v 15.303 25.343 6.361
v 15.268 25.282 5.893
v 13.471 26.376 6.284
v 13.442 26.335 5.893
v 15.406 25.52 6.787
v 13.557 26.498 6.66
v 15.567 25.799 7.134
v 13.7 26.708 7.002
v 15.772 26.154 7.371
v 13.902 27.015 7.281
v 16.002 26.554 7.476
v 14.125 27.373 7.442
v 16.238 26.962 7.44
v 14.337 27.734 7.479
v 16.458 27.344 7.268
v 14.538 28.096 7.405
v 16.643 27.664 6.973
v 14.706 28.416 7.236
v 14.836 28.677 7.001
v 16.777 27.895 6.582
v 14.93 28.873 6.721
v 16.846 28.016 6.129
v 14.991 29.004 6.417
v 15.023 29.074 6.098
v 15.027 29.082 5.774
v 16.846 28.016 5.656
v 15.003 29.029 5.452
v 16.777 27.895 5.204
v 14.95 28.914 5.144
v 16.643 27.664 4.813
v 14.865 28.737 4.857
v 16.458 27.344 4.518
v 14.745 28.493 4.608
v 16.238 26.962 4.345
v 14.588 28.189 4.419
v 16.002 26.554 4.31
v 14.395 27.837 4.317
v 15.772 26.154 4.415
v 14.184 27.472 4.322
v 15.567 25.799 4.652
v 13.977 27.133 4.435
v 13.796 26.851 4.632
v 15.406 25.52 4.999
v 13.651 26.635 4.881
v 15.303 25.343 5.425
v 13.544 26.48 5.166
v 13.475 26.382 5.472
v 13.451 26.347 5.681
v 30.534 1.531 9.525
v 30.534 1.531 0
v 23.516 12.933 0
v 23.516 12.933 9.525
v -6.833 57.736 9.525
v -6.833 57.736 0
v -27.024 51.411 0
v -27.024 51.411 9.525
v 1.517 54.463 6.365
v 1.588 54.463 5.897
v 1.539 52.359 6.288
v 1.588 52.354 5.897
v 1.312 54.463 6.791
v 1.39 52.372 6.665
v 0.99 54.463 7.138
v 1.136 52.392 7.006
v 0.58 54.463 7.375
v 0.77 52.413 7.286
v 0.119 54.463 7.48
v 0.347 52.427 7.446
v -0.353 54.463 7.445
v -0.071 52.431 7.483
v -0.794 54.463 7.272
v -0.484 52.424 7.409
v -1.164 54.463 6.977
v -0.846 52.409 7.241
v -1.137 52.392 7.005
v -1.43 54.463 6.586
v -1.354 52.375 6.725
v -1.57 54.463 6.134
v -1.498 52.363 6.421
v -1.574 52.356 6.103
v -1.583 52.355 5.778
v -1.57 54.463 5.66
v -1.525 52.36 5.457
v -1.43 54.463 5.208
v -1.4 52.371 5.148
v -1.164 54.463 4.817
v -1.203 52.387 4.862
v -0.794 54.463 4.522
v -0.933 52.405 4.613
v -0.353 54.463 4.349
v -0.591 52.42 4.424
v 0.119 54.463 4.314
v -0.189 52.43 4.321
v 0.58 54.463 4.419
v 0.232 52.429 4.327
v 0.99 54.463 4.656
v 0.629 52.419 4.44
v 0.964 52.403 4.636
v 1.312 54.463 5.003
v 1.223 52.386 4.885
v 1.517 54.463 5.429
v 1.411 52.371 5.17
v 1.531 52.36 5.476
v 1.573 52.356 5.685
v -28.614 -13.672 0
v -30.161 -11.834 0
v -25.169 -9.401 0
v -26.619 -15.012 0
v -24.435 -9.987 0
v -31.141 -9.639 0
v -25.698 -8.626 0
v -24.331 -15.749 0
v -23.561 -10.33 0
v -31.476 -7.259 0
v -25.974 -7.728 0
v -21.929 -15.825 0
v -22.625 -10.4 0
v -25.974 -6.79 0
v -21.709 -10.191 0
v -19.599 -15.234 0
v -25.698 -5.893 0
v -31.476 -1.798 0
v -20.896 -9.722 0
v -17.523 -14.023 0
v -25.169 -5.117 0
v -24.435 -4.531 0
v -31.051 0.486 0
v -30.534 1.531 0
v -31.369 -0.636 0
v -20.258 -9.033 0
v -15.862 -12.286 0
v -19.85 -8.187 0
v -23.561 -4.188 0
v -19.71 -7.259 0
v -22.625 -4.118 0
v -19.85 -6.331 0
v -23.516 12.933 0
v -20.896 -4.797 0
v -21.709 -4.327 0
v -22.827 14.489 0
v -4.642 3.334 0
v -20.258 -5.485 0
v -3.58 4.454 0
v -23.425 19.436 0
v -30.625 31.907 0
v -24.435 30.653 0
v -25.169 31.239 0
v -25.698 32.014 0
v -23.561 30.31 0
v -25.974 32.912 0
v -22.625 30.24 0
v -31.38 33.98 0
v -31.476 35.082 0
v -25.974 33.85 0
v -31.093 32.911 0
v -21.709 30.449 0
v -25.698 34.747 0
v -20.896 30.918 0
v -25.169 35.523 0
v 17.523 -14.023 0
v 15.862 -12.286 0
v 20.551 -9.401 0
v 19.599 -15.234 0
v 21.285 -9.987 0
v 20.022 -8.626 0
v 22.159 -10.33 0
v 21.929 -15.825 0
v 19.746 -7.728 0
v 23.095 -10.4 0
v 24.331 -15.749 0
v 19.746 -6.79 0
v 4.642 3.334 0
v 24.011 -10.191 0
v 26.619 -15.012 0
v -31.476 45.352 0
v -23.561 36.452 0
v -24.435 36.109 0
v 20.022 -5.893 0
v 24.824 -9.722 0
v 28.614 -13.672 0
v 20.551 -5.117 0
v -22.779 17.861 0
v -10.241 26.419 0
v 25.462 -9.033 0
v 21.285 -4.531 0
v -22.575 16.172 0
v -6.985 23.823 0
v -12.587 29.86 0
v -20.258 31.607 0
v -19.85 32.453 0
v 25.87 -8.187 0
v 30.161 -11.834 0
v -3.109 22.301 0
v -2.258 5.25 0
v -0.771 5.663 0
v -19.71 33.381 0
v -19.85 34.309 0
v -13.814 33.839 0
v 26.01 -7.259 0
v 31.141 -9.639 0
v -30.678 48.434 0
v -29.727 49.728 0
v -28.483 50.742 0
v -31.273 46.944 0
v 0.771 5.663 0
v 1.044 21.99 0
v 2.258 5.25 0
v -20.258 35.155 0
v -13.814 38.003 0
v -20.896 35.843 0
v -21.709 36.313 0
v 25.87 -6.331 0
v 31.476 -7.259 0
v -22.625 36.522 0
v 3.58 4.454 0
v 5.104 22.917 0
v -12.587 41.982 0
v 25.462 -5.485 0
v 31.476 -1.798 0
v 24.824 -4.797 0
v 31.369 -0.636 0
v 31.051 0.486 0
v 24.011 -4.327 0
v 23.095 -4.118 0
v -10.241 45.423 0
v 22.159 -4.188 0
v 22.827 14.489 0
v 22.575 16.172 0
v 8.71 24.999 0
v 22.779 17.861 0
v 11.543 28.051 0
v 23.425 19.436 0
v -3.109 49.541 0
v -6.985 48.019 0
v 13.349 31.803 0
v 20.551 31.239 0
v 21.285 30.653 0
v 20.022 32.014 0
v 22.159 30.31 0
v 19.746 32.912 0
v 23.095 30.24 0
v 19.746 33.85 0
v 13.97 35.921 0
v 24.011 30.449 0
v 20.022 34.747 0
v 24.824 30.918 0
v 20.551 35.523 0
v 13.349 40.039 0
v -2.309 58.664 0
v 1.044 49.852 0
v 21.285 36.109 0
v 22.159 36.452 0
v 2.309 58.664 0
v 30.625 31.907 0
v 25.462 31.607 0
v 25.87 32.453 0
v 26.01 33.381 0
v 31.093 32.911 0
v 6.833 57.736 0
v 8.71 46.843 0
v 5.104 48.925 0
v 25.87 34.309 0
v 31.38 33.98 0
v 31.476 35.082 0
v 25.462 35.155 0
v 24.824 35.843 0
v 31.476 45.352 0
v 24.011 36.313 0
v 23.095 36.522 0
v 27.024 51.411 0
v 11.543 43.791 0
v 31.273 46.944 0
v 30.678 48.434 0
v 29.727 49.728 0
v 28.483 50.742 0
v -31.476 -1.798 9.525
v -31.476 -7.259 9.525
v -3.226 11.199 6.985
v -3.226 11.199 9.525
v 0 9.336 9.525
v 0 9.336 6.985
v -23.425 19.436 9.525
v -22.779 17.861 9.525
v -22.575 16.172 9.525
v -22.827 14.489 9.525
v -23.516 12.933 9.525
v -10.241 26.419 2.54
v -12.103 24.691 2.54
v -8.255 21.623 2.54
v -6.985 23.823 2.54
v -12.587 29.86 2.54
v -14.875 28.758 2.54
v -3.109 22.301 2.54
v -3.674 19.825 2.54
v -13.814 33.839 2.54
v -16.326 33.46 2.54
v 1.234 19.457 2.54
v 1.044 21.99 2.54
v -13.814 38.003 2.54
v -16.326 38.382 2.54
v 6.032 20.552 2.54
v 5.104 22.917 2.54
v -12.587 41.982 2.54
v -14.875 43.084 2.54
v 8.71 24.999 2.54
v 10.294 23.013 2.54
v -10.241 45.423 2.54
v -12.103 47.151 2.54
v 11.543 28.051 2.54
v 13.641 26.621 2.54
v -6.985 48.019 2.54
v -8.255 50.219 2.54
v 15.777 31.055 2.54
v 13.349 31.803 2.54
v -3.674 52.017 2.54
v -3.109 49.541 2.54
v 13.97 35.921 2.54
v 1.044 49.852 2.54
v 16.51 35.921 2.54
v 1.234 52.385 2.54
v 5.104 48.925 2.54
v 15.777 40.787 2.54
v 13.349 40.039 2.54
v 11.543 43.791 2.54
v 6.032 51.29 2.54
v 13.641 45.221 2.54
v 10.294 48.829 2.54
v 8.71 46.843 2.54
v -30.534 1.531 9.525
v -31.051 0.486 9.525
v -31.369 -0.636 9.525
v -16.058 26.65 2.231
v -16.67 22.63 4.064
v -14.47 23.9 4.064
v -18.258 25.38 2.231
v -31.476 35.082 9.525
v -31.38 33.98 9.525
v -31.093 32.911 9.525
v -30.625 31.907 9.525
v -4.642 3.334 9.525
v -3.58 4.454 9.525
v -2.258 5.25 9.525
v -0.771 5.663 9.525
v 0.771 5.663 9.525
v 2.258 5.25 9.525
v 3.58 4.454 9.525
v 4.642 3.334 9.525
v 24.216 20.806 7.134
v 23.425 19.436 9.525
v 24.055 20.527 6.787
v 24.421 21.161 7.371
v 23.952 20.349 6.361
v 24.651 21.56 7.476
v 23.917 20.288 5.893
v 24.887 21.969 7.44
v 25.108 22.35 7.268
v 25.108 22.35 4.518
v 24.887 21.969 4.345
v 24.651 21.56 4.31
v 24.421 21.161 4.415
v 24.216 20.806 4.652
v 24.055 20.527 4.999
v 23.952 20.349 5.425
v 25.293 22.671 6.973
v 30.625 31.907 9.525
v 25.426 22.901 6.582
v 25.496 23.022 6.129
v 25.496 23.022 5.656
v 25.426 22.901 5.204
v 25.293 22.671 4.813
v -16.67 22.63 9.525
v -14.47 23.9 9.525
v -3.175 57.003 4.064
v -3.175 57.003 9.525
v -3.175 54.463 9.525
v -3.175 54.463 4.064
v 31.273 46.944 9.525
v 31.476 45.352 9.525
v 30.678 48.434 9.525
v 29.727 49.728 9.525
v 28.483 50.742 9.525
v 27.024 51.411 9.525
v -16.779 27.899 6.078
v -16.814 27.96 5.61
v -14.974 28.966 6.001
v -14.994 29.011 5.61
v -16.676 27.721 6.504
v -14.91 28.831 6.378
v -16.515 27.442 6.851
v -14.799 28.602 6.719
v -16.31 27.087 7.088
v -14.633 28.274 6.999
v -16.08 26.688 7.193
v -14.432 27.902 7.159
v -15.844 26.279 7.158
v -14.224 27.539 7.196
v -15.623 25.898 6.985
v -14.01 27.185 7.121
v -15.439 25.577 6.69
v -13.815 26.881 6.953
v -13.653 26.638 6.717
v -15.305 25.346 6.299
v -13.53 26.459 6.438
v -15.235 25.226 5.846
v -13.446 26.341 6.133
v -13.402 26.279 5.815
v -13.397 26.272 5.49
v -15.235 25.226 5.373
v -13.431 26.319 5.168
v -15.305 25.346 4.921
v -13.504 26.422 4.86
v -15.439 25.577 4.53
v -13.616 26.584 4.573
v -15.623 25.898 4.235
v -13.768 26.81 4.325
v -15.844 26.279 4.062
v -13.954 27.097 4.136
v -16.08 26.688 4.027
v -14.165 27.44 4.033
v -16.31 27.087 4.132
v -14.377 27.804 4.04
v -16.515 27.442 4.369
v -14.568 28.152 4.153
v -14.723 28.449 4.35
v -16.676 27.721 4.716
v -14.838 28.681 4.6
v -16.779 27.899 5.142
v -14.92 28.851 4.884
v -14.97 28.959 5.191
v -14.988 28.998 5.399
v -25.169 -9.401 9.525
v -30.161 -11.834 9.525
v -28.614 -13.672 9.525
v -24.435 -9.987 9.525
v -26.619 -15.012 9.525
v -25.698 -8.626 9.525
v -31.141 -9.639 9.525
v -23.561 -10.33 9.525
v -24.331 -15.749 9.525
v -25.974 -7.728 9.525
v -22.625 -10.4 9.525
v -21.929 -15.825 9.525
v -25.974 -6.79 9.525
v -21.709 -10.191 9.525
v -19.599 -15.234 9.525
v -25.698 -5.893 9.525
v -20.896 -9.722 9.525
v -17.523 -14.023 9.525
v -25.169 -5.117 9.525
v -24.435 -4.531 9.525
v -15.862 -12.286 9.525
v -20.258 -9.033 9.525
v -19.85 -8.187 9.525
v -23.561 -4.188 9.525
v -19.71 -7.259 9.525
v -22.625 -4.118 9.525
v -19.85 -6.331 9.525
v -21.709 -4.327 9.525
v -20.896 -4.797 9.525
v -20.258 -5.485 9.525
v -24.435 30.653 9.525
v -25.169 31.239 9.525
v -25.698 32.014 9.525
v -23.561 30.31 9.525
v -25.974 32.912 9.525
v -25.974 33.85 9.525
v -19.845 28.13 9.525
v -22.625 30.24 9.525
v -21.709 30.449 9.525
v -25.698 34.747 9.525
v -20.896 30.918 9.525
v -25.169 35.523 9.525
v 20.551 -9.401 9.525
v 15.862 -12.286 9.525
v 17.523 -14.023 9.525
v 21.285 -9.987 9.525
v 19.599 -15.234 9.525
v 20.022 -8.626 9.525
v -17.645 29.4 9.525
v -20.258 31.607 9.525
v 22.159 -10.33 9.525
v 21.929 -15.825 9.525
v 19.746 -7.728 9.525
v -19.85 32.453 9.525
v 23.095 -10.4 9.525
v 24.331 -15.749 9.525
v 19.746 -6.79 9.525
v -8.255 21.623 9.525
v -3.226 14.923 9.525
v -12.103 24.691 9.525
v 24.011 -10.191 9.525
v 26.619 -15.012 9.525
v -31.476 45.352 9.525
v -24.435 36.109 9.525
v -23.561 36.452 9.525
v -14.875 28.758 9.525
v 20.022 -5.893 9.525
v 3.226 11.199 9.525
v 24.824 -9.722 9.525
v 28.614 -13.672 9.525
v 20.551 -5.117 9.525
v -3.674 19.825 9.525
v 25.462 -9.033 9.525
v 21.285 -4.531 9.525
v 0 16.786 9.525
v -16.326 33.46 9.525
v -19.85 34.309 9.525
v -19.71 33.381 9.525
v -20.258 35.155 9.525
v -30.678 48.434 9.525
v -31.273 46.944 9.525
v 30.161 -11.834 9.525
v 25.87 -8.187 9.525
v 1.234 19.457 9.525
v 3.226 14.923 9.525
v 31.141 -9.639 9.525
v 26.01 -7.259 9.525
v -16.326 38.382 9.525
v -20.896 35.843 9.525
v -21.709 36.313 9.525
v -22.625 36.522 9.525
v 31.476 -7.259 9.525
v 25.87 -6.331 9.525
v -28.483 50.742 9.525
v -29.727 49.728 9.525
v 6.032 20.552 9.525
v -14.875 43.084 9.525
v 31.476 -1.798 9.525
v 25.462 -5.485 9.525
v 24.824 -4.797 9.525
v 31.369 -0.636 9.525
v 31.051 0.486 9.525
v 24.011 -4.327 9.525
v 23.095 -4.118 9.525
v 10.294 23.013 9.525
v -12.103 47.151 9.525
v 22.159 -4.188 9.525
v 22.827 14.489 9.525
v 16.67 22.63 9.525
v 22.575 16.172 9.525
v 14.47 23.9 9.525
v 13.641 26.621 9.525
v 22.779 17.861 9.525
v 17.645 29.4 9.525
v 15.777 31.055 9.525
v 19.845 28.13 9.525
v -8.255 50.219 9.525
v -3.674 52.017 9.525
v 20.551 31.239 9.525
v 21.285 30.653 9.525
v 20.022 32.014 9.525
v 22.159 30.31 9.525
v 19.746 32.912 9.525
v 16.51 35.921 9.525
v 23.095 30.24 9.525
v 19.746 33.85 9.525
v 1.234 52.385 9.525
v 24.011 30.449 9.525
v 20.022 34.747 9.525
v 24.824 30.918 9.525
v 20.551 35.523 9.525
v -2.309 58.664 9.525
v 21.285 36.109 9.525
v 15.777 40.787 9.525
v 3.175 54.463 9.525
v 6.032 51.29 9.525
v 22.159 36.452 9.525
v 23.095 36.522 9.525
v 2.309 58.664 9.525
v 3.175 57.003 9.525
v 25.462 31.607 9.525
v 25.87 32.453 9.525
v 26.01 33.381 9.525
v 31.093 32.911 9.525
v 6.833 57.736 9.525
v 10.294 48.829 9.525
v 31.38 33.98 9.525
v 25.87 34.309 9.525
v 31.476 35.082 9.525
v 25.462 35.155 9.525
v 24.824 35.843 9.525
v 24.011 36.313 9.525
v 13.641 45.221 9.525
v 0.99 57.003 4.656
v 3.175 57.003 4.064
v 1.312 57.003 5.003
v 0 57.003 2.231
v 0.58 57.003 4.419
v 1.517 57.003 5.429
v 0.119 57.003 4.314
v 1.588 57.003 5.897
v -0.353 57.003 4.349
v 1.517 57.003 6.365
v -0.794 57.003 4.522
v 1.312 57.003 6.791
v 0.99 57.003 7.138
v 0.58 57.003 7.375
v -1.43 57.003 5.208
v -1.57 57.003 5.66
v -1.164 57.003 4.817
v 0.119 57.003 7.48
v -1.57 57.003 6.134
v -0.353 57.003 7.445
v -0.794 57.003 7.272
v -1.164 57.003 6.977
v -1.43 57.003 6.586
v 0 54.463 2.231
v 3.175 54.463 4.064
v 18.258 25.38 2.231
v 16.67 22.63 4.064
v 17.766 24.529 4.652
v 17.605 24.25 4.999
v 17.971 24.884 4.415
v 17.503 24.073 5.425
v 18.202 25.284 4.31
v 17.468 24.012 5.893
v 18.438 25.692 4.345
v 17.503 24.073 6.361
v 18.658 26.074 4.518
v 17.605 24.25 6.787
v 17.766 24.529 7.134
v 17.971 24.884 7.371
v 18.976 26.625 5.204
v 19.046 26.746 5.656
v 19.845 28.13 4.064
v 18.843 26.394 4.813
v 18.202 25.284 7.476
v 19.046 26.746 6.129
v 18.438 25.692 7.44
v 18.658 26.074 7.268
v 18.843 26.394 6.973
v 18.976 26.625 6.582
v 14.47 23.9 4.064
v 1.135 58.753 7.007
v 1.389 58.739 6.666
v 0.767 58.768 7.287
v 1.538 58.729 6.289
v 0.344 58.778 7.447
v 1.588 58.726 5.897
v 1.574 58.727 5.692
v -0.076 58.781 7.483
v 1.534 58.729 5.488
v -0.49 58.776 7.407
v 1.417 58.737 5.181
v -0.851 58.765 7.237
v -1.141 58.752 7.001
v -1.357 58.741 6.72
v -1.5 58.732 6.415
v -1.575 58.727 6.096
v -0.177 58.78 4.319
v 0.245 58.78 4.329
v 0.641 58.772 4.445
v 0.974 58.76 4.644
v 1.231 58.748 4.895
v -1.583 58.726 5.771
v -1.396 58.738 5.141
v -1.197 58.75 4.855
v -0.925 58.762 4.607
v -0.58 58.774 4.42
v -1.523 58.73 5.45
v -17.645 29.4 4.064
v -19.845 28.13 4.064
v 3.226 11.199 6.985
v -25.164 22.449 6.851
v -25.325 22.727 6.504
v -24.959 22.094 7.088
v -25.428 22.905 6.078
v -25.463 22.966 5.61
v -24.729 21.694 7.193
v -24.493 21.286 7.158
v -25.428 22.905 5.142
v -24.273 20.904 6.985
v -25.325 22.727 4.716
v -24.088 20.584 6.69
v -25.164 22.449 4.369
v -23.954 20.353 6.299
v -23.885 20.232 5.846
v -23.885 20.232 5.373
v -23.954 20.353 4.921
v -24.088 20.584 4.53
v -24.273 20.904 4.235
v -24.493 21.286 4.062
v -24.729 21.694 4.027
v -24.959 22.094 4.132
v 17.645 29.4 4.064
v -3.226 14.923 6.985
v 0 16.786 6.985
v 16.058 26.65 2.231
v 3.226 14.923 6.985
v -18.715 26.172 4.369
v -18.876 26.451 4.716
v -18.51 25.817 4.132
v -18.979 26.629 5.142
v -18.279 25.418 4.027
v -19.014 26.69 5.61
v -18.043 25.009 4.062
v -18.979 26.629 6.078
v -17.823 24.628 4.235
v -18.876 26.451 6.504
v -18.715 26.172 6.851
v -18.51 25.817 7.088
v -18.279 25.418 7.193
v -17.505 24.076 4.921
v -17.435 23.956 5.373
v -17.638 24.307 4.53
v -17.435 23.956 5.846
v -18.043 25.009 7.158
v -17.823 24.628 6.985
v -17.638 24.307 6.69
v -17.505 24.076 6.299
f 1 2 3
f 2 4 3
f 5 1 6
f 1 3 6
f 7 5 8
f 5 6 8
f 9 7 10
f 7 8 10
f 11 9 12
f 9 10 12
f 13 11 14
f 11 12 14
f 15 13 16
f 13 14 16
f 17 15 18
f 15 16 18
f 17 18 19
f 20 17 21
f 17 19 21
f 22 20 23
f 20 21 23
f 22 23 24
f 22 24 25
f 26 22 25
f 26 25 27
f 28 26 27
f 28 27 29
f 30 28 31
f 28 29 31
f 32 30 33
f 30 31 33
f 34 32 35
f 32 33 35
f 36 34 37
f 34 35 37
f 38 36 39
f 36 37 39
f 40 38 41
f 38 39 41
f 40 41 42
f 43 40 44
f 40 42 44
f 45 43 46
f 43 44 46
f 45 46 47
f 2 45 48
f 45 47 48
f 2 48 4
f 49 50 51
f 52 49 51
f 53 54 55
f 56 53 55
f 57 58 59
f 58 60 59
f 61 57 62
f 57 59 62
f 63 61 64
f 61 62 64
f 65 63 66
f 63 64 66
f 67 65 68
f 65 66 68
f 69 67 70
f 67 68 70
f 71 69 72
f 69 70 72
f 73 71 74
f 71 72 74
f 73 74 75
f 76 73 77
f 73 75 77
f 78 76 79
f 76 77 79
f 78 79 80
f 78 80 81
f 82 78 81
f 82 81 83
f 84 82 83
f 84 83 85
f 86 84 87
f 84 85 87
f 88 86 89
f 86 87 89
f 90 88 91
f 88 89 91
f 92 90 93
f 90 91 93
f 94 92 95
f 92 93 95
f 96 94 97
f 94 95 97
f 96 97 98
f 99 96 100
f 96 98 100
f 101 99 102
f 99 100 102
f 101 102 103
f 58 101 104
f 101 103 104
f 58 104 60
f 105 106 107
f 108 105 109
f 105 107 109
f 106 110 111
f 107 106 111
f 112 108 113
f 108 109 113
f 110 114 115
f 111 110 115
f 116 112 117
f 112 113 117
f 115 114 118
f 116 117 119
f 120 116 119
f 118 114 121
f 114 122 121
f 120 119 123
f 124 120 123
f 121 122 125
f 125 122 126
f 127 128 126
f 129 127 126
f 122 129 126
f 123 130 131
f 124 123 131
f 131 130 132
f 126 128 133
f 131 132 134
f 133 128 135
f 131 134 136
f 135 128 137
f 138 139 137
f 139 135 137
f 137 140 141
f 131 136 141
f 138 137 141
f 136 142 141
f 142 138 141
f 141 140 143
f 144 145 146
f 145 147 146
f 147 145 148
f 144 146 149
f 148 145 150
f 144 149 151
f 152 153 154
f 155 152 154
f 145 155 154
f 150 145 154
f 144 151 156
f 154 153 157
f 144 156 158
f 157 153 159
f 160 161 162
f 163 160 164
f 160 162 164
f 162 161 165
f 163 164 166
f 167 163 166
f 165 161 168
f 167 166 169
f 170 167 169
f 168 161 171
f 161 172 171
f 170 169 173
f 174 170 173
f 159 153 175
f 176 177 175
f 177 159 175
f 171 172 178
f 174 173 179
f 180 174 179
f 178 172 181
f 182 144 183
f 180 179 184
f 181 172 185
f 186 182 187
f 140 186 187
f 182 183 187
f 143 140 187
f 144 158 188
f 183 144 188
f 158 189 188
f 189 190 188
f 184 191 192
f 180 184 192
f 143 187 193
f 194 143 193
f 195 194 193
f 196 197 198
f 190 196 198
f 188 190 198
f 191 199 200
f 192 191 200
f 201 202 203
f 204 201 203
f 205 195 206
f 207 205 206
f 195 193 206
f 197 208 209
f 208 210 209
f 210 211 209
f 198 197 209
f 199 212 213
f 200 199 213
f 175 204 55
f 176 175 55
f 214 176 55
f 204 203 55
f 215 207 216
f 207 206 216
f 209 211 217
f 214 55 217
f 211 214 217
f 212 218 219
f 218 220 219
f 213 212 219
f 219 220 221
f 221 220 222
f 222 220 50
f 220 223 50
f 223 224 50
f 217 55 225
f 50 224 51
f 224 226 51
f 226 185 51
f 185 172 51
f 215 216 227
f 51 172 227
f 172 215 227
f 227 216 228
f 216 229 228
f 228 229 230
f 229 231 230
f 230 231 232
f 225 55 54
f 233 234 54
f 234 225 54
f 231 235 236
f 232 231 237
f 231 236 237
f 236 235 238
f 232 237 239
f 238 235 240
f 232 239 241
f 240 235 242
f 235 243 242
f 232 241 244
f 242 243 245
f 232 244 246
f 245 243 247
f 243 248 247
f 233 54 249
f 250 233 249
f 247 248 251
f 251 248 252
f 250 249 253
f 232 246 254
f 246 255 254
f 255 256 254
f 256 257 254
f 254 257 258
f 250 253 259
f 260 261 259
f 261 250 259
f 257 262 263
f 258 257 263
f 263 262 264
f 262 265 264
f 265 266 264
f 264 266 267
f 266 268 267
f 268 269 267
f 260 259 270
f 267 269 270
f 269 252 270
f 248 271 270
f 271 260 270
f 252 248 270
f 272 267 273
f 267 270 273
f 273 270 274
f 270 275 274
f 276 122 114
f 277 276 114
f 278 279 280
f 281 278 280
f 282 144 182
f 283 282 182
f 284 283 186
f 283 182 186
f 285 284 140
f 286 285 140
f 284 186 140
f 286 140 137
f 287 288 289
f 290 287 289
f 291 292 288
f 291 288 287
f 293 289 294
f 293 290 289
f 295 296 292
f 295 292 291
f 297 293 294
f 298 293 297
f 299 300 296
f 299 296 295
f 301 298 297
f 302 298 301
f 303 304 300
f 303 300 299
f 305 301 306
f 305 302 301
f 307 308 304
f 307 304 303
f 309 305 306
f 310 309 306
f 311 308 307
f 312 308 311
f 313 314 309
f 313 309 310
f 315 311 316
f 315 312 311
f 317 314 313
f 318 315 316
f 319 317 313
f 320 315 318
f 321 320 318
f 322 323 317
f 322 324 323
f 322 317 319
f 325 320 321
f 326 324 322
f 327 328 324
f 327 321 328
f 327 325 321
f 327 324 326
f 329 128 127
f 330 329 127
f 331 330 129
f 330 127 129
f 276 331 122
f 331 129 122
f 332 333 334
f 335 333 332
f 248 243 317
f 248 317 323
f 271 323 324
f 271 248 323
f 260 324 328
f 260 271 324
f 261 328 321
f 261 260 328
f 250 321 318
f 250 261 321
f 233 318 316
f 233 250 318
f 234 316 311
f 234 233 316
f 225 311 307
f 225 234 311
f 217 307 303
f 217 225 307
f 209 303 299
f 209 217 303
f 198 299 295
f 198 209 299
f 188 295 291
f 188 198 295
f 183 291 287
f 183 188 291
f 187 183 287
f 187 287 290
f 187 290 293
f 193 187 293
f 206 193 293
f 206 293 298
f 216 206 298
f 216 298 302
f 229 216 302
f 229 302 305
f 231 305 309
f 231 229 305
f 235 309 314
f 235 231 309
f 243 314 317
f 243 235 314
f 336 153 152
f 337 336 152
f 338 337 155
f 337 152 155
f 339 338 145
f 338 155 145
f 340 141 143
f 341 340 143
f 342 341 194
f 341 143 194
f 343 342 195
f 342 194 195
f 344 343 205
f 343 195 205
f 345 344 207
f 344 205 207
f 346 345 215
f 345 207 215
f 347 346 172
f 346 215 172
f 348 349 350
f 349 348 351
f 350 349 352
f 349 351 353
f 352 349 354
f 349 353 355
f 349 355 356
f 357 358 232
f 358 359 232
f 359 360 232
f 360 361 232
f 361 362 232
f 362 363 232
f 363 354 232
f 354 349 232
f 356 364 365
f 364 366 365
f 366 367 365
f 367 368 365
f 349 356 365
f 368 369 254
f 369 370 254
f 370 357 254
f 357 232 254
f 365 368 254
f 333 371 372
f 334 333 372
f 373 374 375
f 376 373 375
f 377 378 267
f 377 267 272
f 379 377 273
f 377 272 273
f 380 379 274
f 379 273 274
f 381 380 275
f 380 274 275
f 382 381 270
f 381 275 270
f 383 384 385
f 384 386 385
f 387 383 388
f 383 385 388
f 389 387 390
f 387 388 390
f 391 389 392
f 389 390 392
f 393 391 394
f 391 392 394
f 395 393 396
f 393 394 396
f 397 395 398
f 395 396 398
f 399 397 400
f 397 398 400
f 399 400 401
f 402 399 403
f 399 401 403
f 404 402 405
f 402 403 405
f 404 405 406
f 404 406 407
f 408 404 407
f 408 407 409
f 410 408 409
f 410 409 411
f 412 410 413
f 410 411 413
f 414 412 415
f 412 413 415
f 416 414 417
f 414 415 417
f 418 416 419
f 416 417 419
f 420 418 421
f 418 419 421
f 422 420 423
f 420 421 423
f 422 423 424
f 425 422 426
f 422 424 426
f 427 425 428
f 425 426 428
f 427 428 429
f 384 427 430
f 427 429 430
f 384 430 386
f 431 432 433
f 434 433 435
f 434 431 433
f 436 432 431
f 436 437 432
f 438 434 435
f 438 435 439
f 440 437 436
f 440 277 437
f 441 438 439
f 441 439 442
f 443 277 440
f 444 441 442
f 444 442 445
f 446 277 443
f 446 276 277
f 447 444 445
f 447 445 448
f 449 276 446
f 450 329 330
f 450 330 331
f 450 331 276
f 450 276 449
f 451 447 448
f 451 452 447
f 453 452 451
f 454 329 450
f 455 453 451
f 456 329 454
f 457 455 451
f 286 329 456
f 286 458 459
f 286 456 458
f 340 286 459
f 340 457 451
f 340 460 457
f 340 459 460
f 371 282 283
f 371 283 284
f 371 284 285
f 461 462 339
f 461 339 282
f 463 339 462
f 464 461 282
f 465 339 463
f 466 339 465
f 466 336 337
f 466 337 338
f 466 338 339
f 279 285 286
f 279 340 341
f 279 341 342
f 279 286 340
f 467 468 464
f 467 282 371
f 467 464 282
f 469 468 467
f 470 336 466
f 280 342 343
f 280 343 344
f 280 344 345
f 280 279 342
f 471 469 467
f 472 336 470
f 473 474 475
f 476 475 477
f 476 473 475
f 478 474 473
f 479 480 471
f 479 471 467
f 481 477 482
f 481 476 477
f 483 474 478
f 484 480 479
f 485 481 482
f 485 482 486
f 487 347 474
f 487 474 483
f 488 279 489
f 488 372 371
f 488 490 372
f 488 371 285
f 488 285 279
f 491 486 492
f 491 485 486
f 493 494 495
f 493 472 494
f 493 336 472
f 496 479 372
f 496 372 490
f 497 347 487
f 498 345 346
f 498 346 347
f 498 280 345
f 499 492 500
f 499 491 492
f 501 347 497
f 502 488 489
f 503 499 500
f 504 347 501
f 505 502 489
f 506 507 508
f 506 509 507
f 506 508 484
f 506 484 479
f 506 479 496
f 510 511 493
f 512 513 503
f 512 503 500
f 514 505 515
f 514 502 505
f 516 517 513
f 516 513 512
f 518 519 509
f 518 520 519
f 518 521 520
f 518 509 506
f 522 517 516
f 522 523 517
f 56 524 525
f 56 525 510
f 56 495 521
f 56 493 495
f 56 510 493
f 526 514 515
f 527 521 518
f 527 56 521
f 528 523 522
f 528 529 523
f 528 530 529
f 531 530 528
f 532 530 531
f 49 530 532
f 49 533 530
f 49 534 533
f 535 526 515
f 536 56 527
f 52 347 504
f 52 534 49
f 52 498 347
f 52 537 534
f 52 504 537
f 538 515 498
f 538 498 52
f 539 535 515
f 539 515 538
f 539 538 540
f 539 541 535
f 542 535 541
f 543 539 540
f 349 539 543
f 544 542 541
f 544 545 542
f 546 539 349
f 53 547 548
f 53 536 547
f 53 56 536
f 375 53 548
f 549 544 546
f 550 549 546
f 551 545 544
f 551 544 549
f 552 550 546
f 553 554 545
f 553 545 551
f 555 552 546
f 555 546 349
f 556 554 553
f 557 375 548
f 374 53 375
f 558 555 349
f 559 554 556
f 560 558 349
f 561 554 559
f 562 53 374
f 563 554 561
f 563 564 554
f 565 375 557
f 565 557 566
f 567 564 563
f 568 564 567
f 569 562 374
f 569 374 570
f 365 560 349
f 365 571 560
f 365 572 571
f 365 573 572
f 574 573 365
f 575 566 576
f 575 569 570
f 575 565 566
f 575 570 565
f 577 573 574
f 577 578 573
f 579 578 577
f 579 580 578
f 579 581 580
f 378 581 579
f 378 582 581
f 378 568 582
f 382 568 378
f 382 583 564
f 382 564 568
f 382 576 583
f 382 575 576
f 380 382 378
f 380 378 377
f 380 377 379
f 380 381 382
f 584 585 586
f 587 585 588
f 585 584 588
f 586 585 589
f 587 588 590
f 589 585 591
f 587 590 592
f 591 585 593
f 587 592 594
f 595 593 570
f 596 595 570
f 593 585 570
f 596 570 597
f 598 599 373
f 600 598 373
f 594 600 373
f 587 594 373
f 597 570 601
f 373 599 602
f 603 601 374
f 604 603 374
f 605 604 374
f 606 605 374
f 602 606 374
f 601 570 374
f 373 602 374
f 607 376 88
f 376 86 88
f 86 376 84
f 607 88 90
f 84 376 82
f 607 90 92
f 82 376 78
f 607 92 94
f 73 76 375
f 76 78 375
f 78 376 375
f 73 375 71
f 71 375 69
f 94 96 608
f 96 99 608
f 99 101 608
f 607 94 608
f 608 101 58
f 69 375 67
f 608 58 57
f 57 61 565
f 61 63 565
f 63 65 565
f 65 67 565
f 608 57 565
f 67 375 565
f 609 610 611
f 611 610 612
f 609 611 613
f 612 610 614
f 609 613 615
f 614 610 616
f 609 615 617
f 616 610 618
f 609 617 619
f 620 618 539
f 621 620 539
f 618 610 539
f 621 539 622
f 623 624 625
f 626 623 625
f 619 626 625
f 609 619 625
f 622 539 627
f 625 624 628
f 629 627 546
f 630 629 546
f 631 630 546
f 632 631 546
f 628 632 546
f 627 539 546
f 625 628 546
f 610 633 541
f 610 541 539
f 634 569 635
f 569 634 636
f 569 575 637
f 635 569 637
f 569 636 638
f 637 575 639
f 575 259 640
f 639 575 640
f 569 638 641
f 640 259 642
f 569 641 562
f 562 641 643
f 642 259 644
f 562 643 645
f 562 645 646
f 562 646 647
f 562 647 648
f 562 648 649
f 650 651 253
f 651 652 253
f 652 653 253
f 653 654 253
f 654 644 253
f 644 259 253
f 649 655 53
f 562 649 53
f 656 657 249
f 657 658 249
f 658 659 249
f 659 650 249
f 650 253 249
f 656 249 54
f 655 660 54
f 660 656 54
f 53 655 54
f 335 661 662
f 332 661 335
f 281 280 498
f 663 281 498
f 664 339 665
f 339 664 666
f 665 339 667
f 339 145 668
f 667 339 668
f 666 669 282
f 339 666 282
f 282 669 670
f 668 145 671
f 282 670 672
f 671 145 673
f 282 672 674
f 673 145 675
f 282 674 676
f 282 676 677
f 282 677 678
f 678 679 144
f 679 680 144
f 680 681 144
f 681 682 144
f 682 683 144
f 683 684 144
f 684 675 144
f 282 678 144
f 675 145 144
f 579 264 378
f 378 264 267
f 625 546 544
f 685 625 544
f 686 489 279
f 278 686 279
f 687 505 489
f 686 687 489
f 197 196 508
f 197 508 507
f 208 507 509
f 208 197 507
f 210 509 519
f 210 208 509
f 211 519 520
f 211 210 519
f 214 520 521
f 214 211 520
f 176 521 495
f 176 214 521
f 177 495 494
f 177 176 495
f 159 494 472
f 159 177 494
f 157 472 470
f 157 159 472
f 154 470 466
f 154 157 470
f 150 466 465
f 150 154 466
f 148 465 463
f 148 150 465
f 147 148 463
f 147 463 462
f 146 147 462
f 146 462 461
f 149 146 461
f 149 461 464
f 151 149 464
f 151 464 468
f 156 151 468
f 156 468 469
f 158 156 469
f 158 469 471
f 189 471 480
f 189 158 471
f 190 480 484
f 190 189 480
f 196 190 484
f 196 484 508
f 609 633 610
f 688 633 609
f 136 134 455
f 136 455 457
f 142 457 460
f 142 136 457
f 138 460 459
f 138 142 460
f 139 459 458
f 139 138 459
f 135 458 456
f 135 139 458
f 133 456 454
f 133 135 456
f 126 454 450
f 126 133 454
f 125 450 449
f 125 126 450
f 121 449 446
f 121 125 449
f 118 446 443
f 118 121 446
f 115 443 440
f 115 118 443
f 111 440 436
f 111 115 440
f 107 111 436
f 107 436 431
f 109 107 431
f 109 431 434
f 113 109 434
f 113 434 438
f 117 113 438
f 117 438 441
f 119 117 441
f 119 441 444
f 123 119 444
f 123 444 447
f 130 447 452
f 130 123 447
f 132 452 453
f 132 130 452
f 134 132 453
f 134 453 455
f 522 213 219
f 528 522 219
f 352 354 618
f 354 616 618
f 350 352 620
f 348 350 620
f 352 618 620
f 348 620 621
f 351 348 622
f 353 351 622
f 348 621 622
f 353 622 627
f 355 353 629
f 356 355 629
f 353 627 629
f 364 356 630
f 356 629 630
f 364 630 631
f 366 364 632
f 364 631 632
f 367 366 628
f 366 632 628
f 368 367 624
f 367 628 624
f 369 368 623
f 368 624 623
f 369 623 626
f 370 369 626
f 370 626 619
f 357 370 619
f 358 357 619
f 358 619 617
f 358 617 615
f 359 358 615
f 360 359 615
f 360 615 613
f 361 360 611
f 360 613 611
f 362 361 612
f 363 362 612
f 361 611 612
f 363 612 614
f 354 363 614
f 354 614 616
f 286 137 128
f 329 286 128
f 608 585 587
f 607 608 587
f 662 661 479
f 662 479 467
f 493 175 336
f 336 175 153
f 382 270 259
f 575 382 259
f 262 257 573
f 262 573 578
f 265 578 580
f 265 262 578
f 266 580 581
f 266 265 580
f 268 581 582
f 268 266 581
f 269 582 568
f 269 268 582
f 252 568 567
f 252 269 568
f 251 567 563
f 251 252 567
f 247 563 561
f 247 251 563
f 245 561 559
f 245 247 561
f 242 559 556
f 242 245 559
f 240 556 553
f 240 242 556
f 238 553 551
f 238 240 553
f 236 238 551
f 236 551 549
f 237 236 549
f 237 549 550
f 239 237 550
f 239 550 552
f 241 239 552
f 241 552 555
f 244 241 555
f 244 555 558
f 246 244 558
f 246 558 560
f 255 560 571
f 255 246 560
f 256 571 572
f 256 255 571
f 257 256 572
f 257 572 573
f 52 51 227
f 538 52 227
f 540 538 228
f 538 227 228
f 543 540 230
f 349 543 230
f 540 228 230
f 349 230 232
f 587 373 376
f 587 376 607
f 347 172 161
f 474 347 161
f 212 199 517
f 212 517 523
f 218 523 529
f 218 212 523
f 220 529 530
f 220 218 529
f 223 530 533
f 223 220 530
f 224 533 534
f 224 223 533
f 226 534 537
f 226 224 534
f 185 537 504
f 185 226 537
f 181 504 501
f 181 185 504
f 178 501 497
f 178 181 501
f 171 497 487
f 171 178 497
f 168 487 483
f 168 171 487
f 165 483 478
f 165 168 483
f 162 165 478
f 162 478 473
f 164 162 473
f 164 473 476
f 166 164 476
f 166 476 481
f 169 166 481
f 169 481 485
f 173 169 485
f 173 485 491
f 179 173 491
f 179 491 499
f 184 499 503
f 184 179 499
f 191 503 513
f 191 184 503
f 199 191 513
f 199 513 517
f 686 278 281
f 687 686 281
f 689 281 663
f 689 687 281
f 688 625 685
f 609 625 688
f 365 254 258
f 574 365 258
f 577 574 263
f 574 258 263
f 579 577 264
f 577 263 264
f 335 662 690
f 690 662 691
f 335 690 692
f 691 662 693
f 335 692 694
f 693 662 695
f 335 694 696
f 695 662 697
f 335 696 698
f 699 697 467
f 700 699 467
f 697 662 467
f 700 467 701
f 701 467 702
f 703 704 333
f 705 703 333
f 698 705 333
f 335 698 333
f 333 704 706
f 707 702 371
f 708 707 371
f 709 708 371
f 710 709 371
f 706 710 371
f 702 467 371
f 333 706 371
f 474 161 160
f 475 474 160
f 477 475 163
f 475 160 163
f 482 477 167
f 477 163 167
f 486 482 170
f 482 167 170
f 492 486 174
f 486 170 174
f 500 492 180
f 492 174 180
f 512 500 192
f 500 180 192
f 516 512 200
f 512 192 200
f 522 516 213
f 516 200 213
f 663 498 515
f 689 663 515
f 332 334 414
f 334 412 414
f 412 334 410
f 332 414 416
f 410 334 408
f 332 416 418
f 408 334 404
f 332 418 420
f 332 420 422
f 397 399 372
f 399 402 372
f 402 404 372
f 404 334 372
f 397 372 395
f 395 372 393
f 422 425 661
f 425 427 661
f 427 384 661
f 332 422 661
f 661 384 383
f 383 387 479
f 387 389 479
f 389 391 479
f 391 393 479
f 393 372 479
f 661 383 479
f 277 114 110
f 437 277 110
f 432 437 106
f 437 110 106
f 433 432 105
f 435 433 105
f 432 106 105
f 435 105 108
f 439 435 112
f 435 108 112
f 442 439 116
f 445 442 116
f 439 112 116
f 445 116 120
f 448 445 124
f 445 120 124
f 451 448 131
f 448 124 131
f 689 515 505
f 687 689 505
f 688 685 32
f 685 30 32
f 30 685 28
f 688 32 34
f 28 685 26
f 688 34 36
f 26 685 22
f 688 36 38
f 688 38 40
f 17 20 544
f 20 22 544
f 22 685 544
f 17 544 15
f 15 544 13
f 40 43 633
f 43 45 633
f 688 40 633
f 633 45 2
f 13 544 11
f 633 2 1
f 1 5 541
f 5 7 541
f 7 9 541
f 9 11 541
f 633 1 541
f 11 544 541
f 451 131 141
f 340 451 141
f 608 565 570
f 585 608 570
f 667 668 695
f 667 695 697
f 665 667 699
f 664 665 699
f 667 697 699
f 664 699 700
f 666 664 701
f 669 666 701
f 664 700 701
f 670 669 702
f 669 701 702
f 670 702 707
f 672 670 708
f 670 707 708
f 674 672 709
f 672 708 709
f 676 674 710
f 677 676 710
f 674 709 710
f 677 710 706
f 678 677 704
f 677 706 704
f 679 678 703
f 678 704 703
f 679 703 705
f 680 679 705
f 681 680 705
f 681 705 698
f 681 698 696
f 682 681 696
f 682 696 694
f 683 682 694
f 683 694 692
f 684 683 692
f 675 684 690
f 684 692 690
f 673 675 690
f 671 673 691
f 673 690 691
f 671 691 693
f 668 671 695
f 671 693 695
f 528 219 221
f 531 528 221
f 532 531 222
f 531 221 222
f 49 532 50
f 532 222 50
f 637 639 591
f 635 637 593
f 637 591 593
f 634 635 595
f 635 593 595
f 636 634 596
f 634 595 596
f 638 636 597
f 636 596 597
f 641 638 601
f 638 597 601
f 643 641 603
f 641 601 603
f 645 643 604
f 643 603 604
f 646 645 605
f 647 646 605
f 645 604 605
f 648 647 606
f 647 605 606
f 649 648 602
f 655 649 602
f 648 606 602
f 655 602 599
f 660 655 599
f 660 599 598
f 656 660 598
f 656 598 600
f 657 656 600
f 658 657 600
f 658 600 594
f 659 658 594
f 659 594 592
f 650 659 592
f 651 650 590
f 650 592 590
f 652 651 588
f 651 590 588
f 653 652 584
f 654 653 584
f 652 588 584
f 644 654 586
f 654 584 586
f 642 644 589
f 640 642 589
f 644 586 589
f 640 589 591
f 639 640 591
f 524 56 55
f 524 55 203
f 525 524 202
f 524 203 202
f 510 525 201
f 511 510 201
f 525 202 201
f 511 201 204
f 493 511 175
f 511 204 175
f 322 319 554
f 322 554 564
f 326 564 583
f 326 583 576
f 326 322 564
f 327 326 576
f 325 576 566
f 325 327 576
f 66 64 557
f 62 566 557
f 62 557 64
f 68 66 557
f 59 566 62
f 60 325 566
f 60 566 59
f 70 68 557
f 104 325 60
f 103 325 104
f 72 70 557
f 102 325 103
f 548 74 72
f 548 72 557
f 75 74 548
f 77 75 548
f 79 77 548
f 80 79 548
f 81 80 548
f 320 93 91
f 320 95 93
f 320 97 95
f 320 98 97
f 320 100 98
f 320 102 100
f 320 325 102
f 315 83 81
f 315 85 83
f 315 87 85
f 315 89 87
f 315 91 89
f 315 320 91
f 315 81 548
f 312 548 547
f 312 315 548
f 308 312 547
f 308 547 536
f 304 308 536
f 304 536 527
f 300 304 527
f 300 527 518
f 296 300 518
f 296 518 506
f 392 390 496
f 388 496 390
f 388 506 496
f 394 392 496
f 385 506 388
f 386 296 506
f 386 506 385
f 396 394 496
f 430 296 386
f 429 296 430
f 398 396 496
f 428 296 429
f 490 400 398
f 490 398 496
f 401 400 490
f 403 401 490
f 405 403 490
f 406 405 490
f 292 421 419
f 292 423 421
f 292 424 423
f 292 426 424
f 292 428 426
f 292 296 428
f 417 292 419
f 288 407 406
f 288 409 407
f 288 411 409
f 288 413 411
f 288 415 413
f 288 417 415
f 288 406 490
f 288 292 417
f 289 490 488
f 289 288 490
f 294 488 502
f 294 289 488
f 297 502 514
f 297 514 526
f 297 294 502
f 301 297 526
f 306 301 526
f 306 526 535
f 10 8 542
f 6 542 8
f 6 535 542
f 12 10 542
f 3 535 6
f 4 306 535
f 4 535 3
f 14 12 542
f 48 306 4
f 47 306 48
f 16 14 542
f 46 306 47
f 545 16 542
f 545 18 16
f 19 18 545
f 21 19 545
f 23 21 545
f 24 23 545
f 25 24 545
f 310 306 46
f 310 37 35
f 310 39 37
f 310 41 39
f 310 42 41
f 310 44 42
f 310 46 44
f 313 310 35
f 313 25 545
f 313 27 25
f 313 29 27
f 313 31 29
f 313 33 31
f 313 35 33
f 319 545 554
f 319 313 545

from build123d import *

# Parameters (mm, degrees)
F0_R        = 3.1496
F0_R_2      = 16.51
F1_DEPTH    = 9.525
F0_R_3      = 13.97
F2_DEPTH    = 2.54
F4_DEPTH    = 8.636
F5_T1_DEPTH = 2.54
F5_T3_DEPTH = 2.54
F5_T5_DEPTH = 2.54
F5_T7_DEPTH = 2.54
F5_T9_DEPTH = 2.54
F6_R        = 1.5875
F9_DEPTH    = 5.08
F7_R        = 1.5875
F10_DEPTH   = 20.32
F8_R        = 1.5875
F11_DEPTH   = 20.32
F13_DEPTH   = 2.54


# Not quite as in the source:
# - a fillet or chamfer that OpenCascade refuses, or shapes differently, is made with other operations: its cross-section is extruded or revolved along the edge and cut away or added
# - a feature names something its author has since deleted; it is built from what else it names


with BuildPart() as f1:
    # F0 (on Top) → F1 (new body)
    with BuildSketch(Plane.XY):
        with BuildLine():
            ThreePointArc((6.8331158271, 57.7357942584), (0, 58.780934), (-6.8331158271, 57.7357942584))
            Line((-6.8331158271, 57.7357942584), (-27.0242026981, 51.4112964789))
            ThreePointArc((-27.0242026981, 51.4112964789), (-30.2435047856, 49.1112435687), (-31.4761149683, 45.3516130738))
            Line((-31.4761149683, 45.3516130738), (-31.4761149683, 35.0824113719))
            ThreePointArc((-31.4761149683, 35.0824113719), (-31.2597439653, 33.4389104355), (-30.6253762824, 31.9074113719))
            Line((-30.6253762824, 31.9074113719), (-23.4250291837, 19.436044365))
            ThreePointArc((-23.4250291837, 19.436044365), (-22.5749179632, 16.1717783736), (-23.516459851, 12.9327012793))
            Line((-23.516459851, 12.9327012793), (-30.5339456151, 1.5308194413))
            ThreePointArc((-30.5339456151, 1.5308194413), (-31.2360341416, -0.0679607815), (-31.4761149683, -1.7975236443))
            Line((-31.4761149683, -1.7975236443), (-31.4761149683, -7.259066))
            ThreePointArc((-31.4761149683, -7.259066), (-25.5004563551, -15.4606163037), (-15.8622501042, -12.2858874155))
            Line((-15.8622501042, -12.2858874155), (-4.6415514186, 3.3342503548))
            ThreePointArc((-4.6415514186, 3.3342503548), (0, 5.715), (4.6415514186, 3.3342503548))
            Line((4.6415514186, 3.3342503548), (15.8622501042, -12.2858874155))
            ThreePointArc((15.8622501042, -12.2858874155), (25.5004563551, -15.4606163037), (31.4761149683, -7.259066))
            Line((31.4761149683, -7.259066), (31.4761149683, -1.7975236443))
            ThreePointArc((31.4761149683, -1.7975236443), (31.2360341416, -0.0679607815), (30.5339456151, 1.5308194413))
            Line((30.5339456151, 1.5308194413), (23.516459851, 12.9327012793))
            ThreePointArc((23.516459851, 12.9327012793), (22.5749179632, 16.1717783736), (23.4250291837, 19.436044365))
            Line((23.4250291837, 19.436044365), (30.6253762824, 31.9074113719))
            ThreePointArc((30.6253762824, 31.9074113719), (31.2597439653, 33.4389104355), (31.4761149683, 35.0824113719))
            Line((31.4761149683, 35.0824113719), (31.4761149683, 45.3516130738))
            ThreePointArc((31.4761149683, 45.3516130738), (30.2435047856, 49.1112435687), (27.0242026981, 51.4112964789))
            Line((27.0242026981, 51.4112964789), (6.8331158271, 57.7357942584))
        make_face()
        with Locations((-22.86, -7.259066)):
            Circle(F0_R, mode=Mode.SUBTRACT)
        with Locations((22.86, -7.259066)):
            Circle(F0_R, mode=Mode.SUBTRACT)
        with Locations((-22.86, 33.380934)):
            Circle(F0_R, mode=Mode.SUBTRACT)
        with Locations((0, 35.920934)):
            Circle(F0_R_2, mode=Mode.SUBTRACT)
        with Locations((22.86, 33.380934)):
            Circle(F0_R, mode=Mode.SUBTRACT)
    extrude(amount=F1_DEPTH)

    # F0 (on Top) → F2 (join)
    with BuildSketch(Plane.XY):
        with Locations((0, 35.920934)):
            Circle(F0_R_2)
        with Locations((0, 35.920934)):
            Circle(F0_R_3, mode=Mode.SUBTRACT)
    extrude(amount=F2_DEPTH)

    # F3 (on face) → F4 (cut)
    with BuildSketch(Plane.XY.offset(9.525)):
        Polygon((17.6453415423, 29.39956552), (14.4703415423, 23.900304206), (16.6700460679, 22.630304206), (19.8450460679, 28.12956552), align=None)
        Polygon((-3.175, 57.002932274), (-3.175, 54.462932274), (0, 54.462932274), (3.175, 54.462932274), (3.175, 57.002932274), align=None)
        Polygon((-14.4703415423, 23.900304206), (-17.6453415423, 29.39956552), (-19.8450460679, 28.12956552), (-16.6700460679, 22.630304206), align=None)
    extrude(amount=-F4_DEPTH, mode=Mode.SUBTRACT)

    # F5: chamfer of 3.175 x 5.499261314 on 6 edges, made by hand

    # F5_s2 → F5_t1 (join)
    with BuildSketch(Plane(origin=(-0.5036208564, -0.290765637, 0), x_dir=(0, 0, 1), z_dir=(-0.8660254038, -0.5, 0))):
        Polygon((4.064, 34.2834413717), (0.889, 28.7841800576), (0.889, 34.2834413717), align=None)
    extrude(amount=F5_T1_DEPTH)

    # F5_s4 → F5_t3 (join)
    with BuildSketch(Plane(origin=(-2.703325382, -1.560765637, 0), x_dir=(0, 0, 1), z_dir=(0.8660254038, 0.5, 0))):
        Polygon((4.064, -27.9334413717), (0.889, -33.4327026857), (0.889, -27.9334413717), align=None)
    extrude(amount=F5_T3_DEPTH)

    # F5_s6 → F5_t5 (join)
    with BuildSketch(Plane.XZ.offset(-57.002932274)):
        Polygon((-3.175, 4.064), (2.324261314, 0.889), (-3.175, 0.889), align=None)
        Polygon((3.175, 4.064), (-2.324261314, 0.889), (3.175, 0.889), align=None)
    extrude(amount=F5_T5_DEPTH)

    # F5_s8 → F5_t7 (join)
    with BuildSketch(Plane(origin=(2.703325382, -1.560765637, 0), x_dir=(0, 0, 1), z_dir=(-0.8660254038, 0.5, 0))):
        Polygon((4.064, 34.2834413717), (0.889, 28.7841800576), (0.889, 34.2834413717), align=None)
    extrude(amount=F5_T7_DEPTH)

    # F5_s10 → F5_t9 (join)
    with BuildSketch(Plane(origin=(0.5036208564, -0.290765637, 0), x_dir=(0, 0, 1), z_dir=(0.8660254038, -0.5, 0))):
        Polygon((4.064, -27.9334413717), (0.889, -33.4327026857), (0.889, -27.9334413717), align=None)
    extrude(amount=F5_T9_DEPTH)

    # F6 (on face) → F9 (cut, symmetric)
    with BuildSketch(Plane.XZ.offset(-57.002932274)):
        with Locations((0, 5.8970871047)):
            Circle(F6_R)
    extrude(amount=F9_DEPTH, both=True, mode=Mode.SUBTRACT)

    # F7 (on face) → F10 (cut, symmetric)
    with BuildSketch(Plane(origin=(-2.703325382, -1.560765637, 0), x_dir=(-0.5, 0.8660254038, 0), z_dir=(0.8660254038, 0.5, 0))):
        with Locations((31.0334954411, 5.6098689985)):
            Circle(F7_R)
    extrude(amount=F10_DEPTH, both=True, mode=Mode.SUBTRACT)

    # F8 (on face) → F11 (cut, symmetric)
    with BuildSketch(Plane(origin=(2.703325382, -1.560765637, 0), x_dir=(-0.5, -0.8660254038, 0), z_dir=(-0.8660254038, 0.5, 0))):
        with Locations((-31.1158668548, 5.8928)):
            Circle(F8_R)
    extrude(amount=F11_DEPTH, both=True, mode=Mode.SUBTRACT)

    # F12 (on face) → F13 (cut)
    with BuildSketch(Plane.XY.offset(9.525)):
        Polygon((3.2258, 11.1985175016), (3.2258, 14.9233504984), (0, 16.7857669967), (-3.2258, 14.9233504984), (-3.2258, 11.1985175016), (0, 9.3361010033), align=None)
    extrude(amount=-F13_DEPTH, mode=Mode.SUBTRACT)


with BuildPart() as f14_1:
    # F14: copy of F1
    add(f1.part)


solid = f1.part
